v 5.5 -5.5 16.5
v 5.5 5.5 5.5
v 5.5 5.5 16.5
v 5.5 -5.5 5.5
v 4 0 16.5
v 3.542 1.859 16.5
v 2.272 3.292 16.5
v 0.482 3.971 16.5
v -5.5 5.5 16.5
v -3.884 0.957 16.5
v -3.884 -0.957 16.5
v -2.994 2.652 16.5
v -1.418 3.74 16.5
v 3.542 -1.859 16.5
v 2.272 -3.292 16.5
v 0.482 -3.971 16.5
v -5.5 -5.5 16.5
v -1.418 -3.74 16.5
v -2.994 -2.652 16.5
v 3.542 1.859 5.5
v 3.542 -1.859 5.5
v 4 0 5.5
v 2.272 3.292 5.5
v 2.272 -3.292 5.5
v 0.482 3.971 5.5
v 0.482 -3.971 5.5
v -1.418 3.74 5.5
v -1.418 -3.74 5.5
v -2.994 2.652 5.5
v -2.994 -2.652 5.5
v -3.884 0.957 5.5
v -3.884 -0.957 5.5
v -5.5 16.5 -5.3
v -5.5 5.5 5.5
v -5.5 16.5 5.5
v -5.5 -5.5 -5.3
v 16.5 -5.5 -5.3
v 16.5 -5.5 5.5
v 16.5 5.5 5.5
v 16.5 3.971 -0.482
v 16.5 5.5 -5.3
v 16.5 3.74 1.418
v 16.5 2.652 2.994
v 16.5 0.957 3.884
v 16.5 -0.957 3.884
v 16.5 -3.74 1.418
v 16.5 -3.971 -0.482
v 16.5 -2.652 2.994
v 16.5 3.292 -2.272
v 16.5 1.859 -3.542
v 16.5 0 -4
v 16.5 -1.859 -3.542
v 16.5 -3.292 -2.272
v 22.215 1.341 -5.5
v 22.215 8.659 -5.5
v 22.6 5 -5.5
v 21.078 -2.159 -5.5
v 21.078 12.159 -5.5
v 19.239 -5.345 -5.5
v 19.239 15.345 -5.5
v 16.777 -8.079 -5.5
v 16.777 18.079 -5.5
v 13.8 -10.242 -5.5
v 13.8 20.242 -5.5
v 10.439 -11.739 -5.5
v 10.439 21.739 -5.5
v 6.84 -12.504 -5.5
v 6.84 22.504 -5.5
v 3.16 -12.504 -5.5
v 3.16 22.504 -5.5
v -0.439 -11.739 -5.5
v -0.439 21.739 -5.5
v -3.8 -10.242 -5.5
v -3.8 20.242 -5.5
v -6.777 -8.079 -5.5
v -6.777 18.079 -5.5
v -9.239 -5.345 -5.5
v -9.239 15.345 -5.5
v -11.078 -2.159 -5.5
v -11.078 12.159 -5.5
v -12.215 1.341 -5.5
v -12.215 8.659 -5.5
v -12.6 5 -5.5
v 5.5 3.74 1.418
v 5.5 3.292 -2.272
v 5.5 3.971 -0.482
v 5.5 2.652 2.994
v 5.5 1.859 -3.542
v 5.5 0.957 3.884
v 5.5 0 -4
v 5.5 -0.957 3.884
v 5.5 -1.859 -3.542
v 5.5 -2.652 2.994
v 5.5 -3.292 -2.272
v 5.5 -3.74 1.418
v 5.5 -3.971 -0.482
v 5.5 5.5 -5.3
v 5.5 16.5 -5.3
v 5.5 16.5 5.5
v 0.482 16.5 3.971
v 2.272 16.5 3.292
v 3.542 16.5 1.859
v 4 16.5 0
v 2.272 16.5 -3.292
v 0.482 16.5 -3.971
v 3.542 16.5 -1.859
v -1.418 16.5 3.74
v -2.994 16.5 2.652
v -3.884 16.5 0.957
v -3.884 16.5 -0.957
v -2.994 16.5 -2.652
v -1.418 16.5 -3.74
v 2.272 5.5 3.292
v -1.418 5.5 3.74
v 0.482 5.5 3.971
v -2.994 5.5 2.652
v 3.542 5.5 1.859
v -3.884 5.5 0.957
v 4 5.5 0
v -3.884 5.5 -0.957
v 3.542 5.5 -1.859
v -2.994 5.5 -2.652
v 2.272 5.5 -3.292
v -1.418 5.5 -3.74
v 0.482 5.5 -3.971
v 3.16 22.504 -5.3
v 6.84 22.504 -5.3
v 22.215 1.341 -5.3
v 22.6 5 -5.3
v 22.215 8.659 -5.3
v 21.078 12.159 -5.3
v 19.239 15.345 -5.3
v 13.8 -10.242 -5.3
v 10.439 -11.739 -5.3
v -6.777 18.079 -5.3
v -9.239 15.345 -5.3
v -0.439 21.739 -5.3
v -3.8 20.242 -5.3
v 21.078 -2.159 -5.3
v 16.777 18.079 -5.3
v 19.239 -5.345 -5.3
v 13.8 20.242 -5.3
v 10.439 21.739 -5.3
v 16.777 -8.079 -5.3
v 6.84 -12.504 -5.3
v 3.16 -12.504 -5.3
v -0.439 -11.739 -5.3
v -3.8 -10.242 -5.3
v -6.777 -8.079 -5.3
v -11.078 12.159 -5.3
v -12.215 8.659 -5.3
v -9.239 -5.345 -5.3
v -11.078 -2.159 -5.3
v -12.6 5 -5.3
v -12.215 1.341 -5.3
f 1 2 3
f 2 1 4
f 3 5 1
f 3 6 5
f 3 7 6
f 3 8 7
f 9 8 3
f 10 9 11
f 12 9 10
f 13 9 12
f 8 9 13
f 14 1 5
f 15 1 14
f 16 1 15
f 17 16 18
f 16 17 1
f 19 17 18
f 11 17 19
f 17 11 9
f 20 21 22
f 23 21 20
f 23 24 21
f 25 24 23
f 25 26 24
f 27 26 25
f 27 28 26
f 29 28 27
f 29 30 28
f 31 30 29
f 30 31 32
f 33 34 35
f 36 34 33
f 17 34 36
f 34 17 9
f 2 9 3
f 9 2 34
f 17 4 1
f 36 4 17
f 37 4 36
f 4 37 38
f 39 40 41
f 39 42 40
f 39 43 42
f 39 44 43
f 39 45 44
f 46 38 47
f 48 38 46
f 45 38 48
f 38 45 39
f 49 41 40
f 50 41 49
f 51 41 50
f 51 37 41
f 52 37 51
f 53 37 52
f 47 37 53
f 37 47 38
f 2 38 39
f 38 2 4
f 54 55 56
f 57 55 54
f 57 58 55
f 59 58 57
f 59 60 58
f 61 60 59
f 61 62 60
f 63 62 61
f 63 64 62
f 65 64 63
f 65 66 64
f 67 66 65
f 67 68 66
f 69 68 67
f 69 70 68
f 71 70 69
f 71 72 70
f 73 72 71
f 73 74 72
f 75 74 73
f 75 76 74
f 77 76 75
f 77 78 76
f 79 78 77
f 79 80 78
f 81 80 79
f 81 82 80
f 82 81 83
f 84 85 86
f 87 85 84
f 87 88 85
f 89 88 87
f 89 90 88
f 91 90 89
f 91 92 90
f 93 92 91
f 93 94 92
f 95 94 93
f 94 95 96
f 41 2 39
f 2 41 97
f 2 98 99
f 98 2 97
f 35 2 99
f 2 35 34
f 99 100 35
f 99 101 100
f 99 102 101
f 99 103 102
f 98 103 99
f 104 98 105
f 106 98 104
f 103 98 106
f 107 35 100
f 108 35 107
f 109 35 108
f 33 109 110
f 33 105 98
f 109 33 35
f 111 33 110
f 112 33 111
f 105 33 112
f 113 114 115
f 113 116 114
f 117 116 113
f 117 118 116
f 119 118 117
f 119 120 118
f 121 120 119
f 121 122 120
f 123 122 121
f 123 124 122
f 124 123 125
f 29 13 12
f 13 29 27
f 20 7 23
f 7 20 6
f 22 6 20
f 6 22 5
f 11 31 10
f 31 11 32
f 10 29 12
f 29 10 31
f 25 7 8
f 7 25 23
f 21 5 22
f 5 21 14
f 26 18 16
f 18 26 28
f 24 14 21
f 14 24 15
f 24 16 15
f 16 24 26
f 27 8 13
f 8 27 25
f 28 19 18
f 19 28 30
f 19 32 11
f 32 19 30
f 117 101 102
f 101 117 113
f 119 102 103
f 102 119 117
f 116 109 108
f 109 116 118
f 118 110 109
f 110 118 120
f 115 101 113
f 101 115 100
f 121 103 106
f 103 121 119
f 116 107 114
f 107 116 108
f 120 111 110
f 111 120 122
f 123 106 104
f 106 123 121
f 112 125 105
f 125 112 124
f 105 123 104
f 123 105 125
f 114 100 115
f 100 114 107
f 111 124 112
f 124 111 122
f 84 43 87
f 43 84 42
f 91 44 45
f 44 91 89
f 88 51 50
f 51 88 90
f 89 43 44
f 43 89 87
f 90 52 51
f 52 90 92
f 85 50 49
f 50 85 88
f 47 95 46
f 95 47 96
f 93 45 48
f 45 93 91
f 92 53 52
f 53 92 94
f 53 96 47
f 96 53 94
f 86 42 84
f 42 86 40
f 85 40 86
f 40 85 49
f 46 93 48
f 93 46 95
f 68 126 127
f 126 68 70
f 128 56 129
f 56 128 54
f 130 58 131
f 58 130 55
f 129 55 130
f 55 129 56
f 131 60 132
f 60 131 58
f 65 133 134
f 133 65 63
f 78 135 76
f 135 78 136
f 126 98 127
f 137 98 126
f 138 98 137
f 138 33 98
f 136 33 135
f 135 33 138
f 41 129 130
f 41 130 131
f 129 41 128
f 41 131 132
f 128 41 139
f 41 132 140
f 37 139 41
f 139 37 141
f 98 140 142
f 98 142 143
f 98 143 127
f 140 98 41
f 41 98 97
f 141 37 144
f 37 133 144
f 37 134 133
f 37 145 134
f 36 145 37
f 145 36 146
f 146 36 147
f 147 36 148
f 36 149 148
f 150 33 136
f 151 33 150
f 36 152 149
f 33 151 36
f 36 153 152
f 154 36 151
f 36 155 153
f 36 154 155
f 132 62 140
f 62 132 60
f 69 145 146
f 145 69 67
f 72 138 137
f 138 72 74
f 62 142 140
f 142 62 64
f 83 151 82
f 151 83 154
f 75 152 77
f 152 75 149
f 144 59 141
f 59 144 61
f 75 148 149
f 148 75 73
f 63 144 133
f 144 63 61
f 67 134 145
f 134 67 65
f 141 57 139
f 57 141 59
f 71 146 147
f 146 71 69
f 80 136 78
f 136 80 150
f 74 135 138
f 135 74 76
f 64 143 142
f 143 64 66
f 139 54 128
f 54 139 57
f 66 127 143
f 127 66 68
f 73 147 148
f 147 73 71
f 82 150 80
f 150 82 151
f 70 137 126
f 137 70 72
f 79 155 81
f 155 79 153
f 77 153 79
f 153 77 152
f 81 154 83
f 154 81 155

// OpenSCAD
// [FL_INDEX: keywords="openscad, 3d_parametric, One_Cubic_Foot_-_BioCube_Corner_Connector, csg_solid" | COT="Parametric OpenSCAD design from 3DCodeverse"]
// Title: One Cubic Foot - BioCube Corner Connector

// BioCube Corner by Urban Reininger twitter: UrbanAtWork Thingiverse: UrbanAtWork
// Working with the Ross School Innovation lab www.ross.org

	//include <utils/build_plate.scad>

//CUSTOMIZER VARIABLES

// Hole Radius (mm)
cyl_rsize = 4;// [1:20]

// Wall padding "thickness" (mm halved)
wallThickness = 3; //[1:20]

//CUSTOMIZER VARIABLES END

cubesize = cyl_rsize*2+wallThickness;

cyl_hsize = 200;

helperDisc = cubesize*1.6;
helperDiscZloc = -(cyl_rsize + 1.4);

module bioCubeCorner()
{
	module rotcy(rot, cyl_rsize, cyl_hsize) {
		rotate(90, rot)
			cylinder(r = cyl_rsize, h = cyl_hsize, center = true);
	}

union(){

	difference() {
		union(){
	translate([ 0, 0, cubesize ])
		cube([cubesize, cubesize, cubesize], center = true);
	translate([ cubesize, 0, 0 ])
		cube([cubesize, cubesize, cubesize], center = true);
	translate([ 0, cubesize, 0 ])
		cube([cubesize, cubesize, cubesize], center = true);
		}
		rotcy([0, 0, 0], cyl_rsize, cyl_hsize);
		rotcy([1, 0, 0], cyl_rsize, cyl_hsize);
		rotcy([0, 1, 0], cyl_rsize, cyl_hsize);
	}
// This is the corner base cube
		cube([cubesize, cubesize, cubesize], center = true);

// This is a .2mm disk to help it stick to the build plate
translate([ 5, 5, helperDiscZloc ])
	cylinder(r = helperDisc, h = 0.2, center = true);
}

}
bioCubeCorner();
